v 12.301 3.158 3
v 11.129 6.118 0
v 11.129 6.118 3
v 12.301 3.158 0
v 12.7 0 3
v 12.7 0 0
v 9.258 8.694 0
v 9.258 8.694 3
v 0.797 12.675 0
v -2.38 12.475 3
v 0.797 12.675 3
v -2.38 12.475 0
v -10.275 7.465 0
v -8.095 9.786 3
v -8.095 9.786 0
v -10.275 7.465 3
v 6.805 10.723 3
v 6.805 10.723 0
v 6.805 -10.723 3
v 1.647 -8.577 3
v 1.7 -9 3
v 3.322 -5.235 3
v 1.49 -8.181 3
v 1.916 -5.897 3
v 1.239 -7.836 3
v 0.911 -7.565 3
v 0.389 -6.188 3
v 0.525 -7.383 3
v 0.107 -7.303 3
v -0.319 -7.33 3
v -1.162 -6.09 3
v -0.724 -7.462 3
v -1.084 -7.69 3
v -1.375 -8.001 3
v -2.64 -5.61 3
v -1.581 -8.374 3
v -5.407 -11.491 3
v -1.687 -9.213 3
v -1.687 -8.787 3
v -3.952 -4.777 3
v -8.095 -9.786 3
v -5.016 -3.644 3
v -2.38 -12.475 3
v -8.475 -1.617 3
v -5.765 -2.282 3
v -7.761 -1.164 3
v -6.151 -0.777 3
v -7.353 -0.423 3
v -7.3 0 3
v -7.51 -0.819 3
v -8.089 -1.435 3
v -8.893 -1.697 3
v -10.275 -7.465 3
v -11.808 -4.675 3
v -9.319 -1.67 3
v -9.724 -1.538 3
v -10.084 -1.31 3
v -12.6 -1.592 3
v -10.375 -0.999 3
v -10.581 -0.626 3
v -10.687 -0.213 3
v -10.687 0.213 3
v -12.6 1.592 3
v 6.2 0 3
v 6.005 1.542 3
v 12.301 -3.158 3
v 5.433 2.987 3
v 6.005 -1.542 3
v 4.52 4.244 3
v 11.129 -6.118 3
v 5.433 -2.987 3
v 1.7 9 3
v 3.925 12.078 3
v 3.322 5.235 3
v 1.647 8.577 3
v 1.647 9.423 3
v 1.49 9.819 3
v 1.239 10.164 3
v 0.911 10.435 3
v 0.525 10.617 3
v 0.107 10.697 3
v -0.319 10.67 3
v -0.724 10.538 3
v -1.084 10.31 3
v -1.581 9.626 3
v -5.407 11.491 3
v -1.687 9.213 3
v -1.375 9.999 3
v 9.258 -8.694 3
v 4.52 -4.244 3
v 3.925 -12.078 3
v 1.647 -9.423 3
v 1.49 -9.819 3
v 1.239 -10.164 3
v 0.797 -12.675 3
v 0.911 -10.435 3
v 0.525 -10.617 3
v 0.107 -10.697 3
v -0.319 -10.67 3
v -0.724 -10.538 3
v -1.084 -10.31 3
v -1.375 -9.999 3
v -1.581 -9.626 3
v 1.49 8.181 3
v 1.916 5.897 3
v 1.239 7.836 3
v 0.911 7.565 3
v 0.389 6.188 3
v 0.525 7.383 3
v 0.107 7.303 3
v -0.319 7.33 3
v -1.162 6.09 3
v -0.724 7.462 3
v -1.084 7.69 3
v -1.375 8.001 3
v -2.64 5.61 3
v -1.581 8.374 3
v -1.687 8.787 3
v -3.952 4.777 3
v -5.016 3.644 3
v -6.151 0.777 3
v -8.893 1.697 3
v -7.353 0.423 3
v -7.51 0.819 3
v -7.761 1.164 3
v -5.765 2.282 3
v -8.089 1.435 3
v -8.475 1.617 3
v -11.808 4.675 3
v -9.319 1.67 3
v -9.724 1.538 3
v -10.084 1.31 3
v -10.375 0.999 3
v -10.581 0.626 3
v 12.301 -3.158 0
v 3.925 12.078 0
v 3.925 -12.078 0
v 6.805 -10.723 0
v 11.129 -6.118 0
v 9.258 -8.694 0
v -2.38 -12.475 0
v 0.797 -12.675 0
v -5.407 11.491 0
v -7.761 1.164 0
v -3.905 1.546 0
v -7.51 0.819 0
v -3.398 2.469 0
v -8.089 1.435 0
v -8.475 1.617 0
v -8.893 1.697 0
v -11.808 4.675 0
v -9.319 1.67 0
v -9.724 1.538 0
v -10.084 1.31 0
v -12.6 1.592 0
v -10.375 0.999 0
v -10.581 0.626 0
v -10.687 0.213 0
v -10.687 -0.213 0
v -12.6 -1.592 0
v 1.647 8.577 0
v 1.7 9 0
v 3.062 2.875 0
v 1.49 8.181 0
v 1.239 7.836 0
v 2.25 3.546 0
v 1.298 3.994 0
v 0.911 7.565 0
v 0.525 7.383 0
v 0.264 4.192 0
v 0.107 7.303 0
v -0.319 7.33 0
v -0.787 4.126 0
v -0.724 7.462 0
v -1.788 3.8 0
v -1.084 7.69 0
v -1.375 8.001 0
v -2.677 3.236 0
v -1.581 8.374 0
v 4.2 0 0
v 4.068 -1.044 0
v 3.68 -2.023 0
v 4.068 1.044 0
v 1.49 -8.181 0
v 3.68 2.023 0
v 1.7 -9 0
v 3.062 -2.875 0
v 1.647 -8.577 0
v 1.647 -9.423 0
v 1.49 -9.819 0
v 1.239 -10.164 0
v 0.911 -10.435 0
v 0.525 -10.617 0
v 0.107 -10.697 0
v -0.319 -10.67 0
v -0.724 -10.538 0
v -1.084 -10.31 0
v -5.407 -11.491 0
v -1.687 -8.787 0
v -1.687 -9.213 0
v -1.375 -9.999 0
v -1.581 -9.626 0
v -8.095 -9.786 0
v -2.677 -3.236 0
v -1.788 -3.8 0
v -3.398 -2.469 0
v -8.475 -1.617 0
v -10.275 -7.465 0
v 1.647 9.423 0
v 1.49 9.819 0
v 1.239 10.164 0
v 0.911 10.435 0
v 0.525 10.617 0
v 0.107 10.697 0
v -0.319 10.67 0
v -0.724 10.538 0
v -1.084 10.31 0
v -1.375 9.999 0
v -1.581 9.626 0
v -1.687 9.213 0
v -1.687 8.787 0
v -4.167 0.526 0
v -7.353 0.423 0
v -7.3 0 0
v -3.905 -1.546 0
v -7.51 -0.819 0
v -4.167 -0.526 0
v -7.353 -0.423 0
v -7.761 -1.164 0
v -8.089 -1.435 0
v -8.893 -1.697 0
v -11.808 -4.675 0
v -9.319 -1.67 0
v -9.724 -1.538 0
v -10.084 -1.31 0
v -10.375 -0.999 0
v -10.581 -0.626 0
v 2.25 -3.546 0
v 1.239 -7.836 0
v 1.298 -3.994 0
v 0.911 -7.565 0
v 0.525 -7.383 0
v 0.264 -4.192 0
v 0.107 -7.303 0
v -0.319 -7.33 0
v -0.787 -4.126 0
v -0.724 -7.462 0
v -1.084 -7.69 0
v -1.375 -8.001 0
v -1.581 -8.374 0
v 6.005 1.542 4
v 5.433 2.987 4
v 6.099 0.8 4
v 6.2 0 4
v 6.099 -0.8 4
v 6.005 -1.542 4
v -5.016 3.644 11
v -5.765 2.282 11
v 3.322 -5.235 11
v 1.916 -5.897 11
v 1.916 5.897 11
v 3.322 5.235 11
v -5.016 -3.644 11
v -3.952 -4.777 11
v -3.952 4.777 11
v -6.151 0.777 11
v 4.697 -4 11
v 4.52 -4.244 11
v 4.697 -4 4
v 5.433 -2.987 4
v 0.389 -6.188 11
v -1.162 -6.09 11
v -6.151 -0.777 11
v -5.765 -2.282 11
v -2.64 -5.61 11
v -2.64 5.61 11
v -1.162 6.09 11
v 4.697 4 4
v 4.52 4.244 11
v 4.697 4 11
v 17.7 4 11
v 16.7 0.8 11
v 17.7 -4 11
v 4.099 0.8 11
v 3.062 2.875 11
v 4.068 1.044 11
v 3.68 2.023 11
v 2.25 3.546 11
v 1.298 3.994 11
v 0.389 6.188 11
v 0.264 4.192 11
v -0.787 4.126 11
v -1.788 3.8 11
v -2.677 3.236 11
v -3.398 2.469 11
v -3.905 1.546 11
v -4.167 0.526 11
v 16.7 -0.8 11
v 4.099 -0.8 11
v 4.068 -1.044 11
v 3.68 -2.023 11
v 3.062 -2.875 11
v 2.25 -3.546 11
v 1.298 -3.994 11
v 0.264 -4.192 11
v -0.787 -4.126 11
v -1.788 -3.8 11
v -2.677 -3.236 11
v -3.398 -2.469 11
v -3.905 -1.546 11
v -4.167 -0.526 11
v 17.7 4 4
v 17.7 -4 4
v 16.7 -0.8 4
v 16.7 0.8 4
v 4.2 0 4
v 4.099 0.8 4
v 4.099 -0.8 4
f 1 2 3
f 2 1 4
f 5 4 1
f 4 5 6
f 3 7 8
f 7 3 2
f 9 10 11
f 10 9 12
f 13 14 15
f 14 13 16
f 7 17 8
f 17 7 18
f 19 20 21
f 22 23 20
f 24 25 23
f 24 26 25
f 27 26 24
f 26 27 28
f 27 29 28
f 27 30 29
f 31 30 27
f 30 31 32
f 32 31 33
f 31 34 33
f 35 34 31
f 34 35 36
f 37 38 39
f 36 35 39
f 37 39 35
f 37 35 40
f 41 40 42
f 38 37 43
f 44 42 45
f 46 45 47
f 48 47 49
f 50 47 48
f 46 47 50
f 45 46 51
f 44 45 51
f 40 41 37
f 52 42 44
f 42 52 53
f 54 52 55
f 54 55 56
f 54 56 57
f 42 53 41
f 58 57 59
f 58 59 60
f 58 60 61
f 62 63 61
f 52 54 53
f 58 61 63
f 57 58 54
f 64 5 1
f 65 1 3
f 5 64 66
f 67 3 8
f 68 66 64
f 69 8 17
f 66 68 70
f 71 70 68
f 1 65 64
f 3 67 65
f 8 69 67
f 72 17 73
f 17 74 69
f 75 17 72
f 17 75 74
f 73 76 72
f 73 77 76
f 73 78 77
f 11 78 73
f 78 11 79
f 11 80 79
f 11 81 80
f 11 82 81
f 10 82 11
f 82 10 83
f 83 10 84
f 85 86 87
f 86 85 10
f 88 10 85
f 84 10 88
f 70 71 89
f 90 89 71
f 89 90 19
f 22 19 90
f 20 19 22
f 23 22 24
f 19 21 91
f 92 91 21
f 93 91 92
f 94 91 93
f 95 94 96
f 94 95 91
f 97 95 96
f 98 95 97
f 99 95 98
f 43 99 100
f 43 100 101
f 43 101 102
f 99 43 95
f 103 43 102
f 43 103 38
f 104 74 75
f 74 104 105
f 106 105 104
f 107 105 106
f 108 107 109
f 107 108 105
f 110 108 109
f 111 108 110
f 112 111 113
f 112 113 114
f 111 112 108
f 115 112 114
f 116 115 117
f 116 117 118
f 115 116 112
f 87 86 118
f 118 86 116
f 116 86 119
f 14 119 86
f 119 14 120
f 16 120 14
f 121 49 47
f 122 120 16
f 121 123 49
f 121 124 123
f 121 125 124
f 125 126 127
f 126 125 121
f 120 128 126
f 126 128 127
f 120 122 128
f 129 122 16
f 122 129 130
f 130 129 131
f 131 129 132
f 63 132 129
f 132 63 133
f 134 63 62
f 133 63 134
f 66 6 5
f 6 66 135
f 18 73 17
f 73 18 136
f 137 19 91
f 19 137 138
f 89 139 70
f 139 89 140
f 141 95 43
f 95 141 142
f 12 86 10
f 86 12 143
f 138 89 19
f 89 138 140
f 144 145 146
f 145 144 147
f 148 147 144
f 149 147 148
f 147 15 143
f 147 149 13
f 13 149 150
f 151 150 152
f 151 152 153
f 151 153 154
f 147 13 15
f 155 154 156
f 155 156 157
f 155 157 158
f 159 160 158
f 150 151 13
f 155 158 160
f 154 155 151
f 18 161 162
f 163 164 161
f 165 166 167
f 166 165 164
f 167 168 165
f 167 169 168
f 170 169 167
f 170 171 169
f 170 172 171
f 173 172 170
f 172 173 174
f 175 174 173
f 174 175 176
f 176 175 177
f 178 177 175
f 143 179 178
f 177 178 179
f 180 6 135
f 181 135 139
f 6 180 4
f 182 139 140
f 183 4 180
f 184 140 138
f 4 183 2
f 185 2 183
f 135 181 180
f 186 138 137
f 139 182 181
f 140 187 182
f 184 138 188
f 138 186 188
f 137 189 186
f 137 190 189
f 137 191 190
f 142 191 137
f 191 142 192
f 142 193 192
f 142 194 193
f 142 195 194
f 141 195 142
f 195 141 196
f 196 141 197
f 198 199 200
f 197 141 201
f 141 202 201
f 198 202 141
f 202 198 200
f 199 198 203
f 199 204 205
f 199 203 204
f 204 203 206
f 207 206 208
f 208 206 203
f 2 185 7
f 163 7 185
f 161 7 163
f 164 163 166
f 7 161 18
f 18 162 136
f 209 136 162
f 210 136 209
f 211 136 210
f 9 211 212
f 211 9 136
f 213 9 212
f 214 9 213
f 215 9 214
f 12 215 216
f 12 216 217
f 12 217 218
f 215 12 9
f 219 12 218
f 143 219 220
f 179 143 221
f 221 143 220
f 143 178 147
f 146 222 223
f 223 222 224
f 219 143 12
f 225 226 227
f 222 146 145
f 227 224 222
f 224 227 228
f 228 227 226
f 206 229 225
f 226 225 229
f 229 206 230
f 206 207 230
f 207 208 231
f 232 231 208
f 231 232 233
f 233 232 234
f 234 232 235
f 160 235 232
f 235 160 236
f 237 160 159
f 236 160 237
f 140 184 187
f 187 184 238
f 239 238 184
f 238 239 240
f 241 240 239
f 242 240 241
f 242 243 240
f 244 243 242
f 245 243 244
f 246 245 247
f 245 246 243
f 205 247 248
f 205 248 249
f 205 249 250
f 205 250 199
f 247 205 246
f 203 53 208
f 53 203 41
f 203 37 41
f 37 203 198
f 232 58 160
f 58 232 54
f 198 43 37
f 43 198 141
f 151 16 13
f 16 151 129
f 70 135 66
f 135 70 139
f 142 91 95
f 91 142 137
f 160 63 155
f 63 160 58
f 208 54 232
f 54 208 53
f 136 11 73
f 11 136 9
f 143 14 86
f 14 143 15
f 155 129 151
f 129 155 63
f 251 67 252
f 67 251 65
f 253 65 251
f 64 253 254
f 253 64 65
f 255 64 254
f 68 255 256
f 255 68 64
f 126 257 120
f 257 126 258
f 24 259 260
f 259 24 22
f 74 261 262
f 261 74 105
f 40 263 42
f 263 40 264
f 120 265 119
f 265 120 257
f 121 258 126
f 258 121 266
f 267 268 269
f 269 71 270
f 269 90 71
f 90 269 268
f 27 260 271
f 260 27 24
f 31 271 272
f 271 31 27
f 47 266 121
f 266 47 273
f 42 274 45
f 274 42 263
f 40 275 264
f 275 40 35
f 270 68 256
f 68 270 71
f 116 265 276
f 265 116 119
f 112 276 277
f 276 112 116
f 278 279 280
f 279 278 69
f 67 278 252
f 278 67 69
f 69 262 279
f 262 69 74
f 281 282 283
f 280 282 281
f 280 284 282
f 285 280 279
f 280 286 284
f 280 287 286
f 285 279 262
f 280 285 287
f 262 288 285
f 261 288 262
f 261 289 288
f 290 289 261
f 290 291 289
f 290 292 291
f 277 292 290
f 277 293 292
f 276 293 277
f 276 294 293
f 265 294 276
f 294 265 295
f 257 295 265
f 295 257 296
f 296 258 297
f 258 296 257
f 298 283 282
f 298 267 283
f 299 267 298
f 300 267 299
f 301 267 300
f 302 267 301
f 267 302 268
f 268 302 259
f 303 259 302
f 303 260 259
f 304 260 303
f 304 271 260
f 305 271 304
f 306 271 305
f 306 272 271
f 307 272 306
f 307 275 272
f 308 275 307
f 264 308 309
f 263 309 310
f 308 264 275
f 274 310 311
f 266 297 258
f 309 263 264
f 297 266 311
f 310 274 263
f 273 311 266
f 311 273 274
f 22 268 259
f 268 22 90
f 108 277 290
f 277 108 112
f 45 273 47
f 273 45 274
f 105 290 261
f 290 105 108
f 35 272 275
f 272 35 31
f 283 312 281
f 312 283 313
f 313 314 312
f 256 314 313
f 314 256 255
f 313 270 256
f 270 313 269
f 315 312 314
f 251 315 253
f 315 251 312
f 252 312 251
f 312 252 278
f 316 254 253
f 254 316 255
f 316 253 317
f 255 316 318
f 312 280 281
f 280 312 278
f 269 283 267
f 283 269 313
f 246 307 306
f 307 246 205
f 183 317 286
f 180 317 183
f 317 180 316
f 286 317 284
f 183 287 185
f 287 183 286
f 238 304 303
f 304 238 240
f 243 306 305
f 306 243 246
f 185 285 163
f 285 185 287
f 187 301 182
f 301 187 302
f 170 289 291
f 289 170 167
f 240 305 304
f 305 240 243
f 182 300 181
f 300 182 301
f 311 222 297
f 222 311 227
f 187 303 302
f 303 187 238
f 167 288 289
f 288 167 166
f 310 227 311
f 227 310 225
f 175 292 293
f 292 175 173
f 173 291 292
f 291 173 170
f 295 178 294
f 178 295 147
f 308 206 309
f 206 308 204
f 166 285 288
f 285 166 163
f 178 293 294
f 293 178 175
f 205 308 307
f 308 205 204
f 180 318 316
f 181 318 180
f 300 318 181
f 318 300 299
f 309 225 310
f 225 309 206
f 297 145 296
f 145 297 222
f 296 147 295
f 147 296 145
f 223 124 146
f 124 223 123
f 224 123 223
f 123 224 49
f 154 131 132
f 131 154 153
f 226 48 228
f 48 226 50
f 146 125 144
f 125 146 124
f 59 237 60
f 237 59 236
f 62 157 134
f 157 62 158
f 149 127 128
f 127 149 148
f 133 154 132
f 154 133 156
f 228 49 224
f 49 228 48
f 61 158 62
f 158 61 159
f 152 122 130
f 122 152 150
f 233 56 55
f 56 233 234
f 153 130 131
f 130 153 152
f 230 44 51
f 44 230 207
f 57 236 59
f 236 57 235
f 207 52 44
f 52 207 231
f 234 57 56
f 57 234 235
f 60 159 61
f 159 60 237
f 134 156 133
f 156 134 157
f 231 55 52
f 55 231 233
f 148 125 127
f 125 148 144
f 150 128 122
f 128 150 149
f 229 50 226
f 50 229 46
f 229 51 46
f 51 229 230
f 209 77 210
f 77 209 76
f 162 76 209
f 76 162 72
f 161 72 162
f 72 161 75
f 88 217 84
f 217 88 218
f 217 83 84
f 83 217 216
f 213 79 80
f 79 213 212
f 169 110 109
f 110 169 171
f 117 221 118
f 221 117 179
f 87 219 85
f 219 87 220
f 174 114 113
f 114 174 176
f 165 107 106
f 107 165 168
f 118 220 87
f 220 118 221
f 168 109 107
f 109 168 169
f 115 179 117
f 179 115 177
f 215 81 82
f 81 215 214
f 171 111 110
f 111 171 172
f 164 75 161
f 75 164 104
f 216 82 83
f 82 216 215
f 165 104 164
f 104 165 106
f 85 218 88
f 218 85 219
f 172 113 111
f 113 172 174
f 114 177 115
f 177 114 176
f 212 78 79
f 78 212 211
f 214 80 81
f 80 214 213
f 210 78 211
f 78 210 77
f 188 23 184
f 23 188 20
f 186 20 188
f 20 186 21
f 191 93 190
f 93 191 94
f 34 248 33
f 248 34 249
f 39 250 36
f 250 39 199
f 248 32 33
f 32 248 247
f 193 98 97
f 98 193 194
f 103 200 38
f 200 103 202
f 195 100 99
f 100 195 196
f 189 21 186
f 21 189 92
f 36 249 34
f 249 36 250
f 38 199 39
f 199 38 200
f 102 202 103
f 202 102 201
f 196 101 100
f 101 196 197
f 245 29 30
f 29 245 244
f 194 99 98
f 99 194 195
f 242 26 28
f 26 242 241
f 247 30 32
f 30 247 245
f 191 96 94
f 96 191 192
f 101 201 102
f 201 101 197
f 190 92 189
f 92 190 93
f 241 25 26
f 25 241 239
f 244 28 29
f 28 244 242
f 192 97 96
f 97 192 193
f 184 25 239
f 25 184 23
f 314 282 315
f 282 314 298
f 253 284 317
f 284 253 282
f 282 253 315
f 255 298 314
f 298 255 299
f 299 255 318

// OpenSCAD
$fn = 25;
d_1 = 8.0; // axis diameter

r_1 = d_1 / 2 + 0.2;
r_hh = 9.0;       // distance to mounting holes
r_2 = r_1 + 2.0;  // collar place
r_h = 1.5 + 0.2;
r_b = r_hh + r_h + 2.0;

h_b = 3.0;
h_2 = 8.0;
h_3 = 1.0;

difference() {
  union() {
    cylinder( r=r_b, h=h_b );
    translate( [0,0,h_b] ) cylinder( r=r_2, h=h_2 );
    
    translate( [r_1-0.5,-4.0,h_b+1] ) cube( [14.0,8.0,h_2-1] );
  }
  cylinder( r=r_1, h=h_b+h_2+h_3 );
  translate( [-r_hh,0,0] ) cylinder( r=r_h, h=h_b );
  // translate( [ r_hh,0,0] ) cylinder( r=r_h, h=h_b );
  translate( [0, r_hh,0] ) cylinder( r=r_h, h=h_b );
  translate( [0,-r_hh,0] ) cylinder( r=r_h, h=h_b );
  #translate( [r_1-0.5,-0.8,h_b+1] ) cube( [13.0,1.6,h_2-1] );
  
  
}
